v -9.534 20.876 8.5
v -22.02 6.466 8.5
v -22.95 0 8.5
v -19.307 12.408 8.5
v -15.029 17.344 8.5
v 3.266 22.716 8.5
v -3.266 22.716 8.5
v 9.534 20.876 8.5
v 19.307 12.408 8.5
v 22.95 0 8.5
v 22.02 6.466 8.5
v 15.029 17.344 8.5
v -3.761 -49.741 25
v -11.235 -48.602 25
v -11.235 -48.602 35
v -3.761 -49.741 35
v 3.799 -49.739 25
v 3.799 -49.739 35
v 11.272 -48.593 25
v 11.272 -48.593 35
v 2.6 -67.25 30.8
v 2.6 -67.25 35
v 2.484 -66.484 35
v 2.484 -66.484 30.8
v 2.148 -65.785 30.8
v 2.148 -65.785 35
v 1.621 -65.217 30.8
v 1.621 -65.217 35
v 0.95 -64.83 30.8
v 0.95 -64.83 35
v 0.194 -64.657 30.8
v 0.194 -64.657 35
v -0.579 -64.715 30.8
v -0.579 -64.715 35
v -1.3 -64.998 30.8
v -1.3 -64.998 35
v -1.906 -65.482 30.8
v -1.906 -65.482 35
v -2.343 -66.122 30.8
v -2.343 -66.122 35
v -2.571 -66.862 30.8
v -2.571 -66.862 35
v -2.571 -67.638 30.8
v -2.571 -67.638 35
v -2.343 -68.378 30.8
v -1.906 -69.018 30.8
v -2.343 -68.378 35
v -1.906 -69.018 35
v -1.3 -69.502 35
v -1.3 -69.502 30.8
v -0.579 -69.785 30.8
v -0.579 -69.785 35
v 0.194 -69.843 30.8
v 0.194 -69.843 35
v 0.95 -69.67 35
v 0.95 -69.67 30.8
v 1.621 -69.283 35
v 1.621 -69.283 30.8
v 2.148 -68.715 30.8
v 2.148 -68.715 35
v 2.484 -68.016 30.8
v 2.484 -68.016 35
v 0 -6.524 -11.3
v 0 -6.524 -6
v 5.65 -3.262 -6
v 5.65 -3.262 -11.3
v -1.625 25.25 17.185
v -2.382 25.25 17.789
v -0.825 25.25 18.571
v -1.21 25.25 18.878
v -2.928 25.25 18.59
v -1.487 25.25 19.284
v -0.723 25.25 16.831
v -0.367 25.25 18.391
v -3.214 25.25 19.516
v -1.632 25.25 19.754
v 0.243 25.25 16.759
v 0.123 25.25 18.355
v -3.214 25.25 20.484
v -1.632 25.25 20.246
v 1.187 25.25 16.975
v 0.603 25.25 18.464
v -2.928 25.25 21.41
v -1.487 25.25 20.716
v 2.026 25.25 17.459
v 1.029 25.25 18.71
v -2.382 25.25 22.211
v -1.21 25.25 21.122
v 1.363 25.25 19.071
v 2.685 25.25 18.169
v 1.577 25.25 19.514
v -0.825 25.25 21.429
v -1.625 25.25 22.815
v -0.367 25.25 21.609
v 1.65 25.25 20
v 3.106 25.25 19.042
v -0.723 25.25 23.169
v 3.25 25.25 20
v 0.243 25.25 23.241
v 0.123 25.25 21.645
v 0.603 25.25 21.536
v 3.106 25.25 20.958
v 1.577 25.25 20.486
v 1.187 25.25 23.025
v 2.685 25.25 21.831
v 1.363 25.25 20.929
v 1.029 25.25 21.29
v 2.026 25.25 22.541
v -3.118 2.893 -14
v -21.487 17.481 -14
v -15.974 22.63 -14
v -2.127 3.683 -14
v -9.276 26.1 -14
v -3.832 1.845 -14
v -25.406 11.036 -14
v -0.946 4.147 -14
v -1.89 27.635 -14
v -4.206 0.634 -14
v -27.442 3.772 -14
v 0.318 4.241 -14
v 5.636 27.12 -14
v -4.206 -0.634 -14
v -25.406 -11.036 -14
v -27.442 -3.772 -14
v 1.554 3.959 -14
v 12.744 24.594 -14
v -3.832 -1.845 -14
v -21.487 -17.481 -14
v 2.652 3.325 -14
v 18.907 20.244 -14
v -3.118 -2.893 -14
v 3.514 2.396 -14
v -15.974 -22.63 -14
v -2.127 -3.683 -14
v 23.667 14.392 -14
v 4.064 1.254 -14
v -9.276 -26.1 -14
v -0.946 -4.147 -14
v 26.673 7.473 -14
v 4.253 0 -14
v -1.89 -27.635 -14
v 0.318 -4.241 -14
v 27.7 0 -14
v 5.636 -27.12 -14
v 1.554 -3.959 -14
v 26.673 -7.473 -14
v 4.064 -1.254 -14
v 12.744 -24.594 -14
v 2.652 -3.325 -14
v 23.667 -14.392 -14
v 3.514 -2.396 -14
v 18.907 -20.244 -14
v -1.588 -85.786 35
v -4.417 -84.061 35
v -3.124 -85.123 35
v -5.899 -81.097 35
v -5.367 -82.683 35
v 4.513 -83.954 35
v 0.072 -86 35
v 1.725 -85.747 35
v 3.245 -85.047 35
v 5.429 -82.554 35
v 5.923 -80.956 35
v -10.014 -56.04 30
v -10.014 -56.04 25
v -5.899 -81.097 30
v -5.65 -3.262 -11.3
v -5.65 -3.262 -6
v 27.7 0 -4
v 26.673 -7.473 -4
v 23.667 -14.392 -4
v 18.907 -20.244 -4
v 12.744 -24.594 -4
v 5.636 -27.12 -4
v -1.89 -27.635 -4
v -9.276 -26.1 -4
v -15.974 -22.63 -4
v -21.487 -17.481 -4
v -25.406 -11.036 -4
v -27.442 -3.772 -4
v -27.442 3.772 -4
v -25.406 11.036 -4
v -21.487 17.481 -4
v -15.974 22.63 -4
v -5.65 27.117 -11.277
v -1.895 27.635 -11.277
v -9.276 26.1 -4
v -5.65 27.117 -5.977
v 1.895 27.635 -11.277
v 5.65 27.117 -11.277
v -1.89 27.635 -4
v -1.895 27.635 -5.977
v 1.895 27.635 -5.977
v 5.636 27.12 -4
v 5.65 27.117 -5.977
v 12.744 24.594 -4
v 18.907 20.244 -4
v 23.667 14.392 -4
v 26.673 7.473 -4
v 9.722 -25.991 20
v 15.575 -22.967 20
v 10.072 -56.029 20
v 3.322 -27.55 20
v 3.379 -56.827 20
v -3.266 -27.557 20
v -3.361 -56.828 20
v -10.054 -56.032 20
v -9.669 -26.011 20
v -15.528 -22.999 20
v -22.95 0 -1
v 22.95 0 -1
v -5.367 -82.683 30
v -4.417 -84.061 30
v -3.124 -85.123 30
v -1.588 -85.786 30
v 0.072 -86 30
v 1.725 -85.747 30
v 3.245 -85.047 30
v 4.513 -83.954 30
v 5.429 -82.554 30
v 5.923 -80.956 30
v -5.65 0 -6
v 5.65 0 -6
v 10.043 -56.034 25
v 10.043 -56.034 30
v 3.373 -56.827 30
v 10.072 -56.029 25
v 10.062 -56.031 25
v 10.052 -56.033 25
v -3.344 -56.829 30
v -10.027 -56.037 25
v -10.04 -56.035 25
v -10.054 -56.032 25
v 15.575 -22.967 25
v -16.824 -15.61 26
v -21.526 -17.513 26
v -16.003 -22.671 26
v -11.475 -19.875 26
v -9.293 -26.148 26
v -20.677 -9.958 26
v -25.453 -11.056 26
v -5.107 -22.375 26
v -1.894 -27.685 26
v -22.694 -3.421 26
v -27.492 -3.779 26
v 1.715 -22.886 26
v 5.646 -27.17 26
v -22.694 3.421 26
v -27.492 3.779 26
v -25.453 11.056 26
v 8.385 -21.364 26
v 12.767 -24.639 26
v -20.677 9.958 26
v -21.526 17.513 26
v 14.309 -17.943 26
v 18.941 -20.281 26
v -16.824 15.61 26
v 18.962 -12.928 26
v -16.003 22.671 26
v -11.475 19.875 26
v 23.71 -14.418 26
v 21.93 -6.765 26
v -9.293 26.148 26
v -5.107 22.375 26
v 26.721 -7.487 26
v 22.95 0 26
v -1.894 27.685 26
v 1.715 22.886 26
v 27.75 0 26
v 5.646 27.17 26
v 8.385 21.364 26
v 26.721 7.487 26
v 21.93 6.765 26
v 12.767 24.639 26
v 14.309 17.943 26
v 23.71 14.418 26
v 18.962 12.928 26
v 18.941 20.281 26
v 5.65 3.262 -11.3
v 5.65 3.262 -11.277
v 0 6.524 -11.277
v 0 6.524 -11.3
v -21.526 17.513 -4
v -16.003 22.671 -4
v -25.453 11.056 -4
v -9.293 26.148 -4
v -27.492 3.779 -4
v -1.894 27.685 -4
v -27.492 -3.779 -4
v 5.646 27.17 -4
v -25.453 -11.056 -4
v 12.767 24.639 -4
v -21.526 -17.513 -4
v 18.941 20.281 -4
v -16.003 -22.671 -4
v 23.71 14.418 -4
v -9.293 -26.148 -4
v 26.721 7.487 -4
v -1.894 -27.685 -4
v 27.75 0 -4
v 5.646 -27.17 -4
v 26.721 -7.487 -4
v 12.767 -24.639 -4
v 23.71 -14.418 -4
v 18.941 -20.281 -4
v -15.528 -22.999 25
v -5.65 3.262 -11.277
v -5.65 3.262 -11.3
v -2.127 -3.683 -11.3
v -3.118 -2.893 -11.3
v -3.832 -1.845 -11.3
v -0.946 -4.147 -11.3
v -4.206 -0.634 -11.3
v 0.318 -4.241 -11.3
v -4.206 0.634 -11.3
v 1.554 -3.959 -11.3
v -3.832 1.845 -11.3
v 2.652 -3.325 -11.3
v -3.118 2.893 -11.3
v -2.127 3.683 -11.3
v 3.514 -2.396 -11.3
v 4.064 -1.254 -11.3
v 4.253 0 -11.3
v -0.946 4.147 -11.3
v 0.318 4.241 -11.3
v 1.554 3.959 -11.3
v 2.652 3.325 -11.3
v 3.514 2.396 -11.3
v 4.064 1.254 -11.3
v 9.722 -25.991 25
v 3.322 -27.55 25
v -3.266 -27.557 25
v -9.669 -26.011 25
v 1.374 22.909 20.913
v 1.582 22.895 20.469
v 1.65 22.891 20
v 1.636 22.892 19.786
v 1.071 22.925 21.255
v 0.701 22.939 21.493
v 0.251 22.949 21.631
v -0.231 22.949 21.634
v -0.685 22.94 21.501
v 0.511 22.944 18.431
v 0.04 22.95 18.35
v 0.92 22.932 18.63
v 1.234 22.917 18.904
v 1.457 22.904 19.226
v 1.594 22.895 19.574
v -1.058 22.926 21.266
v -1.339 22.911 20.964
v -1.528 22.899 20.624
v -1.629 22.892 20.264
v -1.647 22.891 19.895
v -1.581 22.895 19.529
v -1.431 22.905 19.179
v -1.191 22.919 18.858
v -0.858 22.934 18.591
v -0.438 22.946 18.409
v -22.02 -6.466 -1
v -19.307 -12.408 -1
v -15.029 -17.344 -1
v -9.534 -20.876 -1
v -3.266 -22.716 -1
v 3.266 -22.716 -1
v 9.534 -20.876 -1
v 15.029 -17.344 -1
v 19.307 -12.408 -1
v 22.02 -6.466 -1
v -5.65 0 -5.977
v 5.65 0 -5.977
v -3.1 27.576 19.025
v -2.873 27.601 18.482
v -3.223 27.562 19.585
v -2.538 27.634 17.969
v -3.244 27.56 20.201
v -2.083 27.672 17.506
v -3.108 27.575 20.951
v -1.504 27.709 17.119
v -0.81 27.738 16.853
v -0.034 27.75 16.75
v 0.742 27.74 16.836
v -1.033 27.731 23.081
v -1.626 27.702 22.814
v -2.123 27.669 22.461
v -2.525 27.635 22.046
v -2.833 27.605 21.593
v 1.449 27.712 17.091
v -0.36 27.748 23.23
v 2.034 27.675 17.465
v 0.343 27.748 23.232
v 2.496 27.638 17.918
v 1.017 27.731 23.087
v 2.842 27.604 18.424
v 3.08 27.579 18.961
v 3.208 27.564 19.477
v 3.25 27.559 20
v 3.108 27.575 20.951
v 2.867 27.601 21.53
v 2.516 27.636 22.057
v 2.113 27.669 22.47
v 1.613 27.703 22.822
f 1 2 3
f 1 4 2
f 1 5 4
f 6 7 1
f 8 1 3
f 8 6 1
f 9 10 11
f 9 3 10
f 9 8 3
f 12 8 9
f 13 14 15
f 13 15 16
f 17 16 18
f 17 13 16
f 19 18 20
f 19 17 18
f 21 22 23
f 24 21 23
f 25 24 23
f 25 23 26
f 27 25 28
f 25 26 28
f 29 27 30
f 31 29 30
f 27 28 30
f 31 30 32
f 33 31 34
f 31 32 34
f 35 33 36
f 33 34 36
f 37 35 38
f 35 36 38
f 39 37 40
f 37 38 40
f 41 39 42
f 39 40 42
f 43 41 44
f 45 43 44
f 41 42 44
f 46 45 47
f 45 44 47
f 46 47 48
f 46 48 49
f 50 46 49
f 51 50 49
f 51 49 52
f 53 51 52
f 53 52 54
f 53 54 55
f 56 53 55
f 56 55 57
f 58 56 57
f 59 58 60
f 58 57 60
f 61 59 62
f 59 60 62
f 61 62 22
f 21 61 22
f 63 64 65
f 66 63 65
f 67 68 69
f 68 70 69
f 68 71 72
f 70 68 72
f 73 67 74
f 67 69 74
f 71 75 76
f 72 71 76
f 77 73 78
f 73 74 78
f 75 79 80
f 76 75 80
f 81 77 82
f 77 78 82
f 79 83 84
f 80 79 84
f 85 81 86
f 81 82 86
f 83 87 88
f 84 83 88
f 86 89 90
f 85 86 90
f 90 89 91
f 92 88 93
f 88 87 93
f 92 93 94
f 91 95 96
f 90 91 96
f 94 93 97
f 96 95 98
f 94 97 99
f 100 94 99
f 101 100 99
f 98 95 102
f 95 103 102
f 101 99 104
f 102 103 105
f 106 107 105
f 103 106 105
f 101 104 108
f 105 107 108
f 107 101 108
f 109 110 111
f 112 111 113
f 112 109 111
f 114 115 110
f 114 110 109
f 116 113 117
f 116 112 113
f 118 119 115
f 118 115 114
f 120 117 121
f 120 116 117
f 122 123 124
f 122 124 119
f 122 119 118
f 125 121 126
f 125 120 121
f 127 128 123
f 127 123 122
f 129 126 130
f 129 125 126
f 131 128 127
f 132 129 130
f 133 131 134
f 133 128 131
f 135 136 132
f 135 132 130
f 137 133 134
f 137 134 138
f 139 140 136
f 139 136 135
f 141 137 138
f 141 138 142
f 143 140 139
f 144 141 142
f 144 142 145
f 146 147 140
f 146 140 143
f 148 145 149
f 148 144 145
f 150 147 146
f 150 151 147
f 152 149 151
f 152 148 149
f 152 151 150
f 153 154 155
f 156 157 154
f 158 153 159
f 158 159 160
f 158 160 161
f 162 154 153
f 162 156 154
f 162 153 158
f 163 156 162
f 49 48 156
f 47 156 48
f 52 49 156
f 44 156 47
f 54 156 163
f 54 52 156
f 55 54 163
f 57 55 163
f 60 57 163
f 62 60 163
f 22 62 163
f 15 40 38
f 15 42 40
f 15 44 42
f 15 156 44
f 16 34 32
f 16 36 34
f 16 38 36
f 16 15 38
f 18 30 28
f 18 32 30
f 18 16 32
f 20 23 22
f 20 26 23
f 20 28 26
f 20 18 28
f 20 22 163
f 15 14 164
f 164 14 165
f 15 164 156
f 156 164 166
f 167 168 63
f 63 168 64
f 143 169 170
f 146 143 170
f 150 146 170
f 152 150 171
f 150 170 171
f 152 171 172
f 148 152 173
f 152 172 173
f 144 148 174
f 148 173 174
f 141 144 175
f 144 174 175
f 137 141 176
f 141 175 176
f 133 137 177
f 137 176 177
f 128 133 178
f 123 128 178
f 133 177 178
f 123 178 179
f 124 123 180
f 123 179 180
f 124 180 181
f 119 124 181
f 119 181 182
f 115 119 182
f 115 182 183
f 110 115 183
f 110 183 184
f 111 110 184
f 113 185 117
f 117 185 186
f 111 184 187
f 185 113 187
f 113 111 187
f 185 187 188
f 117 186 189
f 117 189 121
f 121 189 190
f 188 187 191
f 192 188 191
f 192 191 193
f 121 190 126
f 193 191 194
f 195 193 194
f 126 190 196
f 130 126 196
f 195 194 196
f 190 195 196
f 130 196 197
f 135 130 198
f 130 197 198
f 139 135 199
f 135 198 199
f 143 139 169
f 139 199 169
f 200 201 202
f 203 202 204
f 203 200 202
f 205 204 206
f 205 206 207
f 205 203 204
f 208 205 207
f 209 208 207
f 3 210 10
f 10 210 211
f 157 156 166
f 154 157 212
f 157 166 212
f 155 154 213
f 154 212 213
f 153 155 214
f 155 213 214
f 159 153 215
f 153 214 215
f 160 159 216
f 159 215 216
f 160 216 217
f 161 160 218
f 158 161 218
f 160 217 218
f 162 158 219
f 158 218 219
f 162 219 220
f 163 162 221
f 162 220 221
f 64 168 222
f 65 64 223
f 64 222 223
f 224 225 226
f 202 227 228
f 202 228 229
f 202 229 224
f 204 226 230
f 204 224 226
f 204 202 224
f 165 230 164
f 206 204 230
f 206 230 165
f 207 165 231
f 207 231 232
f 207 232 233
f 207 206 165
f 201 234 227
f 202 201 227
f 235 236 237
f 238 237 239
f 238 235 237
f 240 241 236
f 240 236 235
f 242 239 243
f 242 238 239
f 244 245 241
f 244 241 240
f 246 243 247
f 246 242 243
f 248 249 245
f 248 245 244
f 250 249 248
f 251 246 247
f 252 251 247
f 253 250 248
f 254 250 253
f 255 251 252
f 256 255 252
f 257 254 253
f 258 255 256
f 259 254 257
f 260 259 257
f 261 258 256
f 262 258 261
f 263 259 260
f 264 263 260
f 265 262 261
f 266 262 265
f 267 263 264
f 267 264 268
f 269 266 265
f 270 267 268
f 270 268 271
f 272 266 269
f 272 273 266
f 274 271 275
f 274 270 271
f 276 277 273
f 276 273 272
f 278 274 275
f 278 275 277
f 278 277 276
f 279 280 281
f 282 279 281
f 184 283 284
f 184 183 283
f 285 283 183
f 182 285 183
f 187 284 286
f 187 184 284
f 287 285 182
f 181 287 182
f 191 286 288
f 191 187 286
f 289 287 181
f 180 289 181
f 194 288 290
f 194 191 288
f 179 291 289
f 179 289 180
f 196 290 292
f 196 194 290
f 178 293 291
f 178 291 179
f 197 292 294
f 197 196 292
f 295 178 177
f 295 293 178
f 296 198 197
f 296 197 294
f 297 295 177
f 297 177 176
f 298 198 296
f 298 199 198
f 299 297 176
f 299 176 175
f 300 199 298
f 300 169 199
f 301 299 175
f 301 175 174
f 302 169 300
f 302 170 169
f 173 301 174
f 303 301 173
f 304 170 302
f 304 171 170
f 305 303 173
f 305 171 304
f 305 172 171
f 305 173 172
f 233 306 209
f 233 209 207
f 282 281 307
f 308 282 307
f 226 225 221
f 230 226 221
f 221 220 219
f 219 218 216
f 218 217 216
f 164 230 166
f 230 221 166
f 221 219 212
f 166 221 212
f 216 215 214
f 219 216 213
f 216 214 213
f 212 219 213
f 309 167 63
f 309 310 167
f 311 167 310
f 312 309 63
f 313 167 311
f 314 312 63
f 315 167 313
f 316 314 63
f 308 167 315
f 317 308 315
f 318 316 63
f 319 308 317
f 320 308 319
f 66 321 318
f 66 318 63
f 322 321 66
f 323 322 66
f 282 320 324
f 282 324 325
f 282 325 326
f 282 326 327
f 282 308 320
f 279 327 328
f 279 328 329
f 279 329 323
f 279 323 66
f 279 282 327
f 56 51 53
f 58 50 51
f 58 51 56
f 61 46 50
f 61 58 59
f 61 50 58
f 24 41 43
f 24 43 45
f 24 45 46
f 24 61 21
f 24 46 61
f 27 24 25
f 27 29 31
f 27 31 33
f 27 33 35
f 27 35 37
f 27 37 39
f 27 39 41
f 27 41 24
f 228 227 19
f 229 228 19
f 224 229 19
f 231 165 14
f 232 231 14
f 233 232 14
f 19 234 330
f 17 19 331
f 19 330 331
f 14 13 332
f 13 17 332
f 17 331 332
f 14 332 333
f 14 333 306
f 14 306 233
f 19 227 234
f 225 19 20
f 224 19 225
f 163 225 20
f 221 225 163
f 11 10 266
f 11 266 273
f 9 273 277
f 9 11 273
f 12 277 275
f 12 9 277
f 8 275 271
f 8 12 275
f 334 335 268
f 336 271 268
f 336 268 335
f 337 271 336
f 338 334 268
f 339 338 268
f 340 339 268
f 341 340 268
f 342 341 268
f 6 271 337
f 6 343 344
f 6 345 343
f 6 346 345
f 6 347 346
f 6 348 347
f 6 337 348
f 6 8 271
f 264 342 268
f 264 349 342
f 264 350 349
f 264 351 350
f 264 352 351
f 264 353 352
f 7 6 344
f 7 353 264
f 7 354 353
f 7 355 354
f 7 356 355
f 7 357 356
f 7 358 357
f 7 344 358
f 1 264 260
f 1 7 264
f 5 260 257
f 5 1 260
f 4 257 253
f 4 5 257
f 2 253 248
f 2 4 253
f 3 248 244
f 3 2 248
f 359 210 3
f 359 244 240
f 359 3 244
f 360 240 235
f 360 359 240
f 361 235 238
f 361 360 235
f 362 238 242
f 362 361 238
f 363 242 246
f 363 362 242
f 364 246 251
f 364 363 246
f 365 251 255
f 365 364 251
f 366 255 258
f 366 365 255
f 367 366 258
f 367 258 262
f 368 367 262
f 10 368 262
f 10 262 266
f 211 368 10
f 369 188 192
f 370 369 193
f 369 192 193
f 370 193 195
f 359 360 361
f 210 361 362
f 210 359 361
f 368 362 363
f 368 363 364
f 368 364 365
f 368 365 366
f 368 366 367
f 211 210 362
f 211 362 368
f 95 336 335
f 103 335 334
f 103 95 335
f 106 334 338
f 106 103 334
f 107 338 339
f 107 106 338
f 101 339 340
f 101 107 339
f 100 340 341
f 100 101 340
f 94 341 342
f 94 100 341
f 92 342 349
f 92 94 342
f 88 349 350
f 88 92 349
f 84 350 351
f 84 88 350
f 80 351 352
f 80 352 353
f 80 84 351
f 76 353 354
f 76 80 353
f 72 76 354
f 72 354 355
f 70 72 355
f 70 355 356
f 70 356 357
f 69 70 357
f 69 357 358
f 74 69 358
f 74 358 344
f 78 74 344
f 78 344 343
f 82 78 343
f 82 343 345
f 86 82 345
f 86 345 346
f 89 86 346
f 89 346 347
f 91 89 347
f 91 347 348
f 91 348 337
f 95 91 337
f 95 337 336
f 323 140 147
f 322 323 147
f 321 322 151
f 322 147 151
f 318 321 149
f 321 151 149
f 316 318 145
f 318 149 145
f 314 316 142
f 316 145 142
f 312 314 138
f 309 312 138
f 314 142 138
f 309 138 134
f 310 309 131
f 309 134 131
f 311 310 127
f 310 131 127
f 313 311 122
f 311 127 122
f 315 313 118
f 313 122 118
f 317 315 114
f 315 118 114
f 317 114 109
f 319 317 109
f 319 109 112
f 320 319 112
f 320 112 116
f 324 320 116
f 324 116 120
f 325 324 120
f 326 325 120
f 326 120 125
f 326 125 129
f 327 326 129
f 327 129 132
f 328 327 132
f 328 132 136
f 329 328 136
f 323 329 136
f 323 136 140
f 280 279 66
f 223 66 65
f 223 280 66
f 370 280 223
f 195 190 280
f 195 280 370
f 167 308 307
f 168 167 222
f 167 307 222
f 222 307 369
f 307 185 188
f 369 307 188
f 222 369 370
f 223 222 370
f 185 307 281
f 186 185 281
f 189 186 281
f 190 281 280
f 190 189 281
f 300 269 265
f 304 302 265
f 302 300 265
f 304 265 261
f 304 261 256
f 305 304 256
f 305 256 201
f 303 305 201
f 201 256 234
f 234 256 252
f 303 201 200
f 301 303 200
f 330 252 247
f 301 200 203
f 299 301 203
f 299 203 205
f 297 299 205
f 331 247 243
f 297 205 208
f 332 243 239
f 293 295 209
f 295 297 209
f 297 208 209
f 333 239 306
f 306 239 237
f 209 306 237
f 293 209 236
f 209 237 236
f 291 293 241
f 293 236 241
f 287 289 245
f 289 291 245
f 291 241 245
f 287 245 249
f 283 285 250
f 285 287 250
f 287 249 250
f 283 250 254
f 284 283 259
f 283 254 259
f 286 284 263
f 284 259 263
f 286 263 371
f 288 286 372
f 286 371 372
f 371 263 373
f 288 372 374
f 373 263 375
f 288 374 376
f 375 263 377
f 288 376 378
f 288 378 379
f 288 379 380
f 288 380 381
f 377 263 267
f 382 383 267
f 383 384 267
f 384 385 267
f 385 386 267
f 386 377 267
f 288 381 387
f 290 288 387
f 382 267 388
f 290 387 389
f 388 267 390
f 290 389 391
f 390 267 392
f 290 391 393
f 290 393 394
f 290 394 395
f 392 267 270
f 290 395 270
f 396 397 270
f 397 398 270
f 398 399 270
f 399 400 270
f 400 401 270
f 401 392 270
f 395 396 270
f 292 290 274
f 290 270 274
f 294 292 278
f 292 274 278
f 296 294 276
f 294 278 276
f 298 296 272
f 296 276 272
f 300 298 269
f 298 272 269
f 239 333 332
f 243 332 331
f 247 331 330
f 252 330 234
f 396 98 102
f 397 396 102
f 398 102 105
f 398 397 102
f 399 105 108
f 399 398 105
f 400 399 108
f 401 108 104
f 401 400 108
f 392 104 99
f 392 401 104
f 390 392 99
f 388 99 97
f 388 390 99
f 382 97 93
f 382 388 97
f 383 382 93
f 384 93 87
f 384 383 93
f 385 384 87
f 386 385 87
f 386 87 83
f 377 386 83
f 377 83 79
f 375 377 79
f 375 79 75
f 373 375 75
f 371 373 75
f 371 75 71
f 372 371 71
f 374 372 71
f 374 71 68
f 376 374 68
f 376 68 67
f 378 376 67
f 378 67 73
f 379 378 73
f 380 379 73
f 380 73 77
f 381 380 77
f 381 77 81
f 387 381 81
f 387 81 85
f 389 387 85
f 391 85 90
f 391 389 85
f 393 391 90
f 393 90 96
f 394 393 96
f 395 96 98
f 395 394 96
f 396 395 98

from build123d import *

# Parameters (mm, degrees)
CYLINDER016_R     = 1.65
CYLINDER016_DEPTH = 50
CYLINDER017_R     = 3.25
CYLINDER017_DEPTH = 2.5
BOX005_W          = 80
BOX005_H          = 100
BOX005_DEPTH      = 9.5
CYLINDER014_R     = 22.95
CYLINDER014_DEPTH = 27
CYLINDER015_R     = 27.75
CYLINDER015_DEPTH = 40
SKETCH013_R       = 27.75
PAD001_DEPTH      = 10
SKETCH014_W       = 24
SKETCH014_H       = 14.2
POCKET013_DEPTH   = 28
SKETCH015_R       = 8.1
POCKET014_DEPTH   = 15
POCKET015_DEPTH   = 14.4
PAD003_DEPTH      = 5
PAD004_DEPTH      = 10
POCKET017_DEPTH   = 10
SKETCH022_R       = 2.6
POCKET018_DEPTH   = 4.2
SKETCH023_W       = 108.293205
SKETCH023_H       = 87.132465
POCKET019_DEPTH   = 20
SKETCH024_R       = 27.699707
PAD005_DEPTH      = 10
SKETCH025_W       = 11.3
SKETCH025_H       = 5.3
POCKET020_DEPTH   = 33
POCKET021_DEPTH   = 5.3
SKETCH027_R       = 4.253317
POCKET022_DEPTH   = 8


with BuildPart() as cylinder016:
    # Cylinder016 → Cylinder016 (new body)
    with BuildSketch(Plane(origin=(0, 50, 20), x_dir=(1, 0, 0), z_dir=(0, -1, 0))):
        Circle(CYLINDER016_R)
    extrude(amount=CYLINDER016_DEPTH)


with BuildPart() as cylinder017:
    # Cylinder017 → Cylinder017 (new body)
    with BuildSketch(Plane(origin=(0, 27.75, 20), x_dir=(1, 0, 0), z_dir=(0, -1, 0))):
        Circle(CYLINDER017_R)
    extrude(amount=CYLINDER017_DEPTH)


with BuildPart() as addcube001:
    # Box005 → Box005 (new body)
    with BuildSketch(Plane(origin=(-40, 0, -1), x_dir=(1, 0, 0), z_dir=(0, 0, 1))):
        with Locations((40, 50)):
            Rectangle(BOX005_W, BOX005_H)
    extrude(amount=BOX005_DEPTH)


with BuildPart() as fusion007:
    # Cylinder014 → Cylinder014 (new body)
    with BuildSketch(Plane.XY.offset(-1)):
        Circle(CYLINDER014_R)
    extrude(amount=CYLINDER014_DEPTH)

    # Cut011: cut AddCube001
    add(addcube001.part, mode=Mode.SUBTRACT)

    # Fusion007: union Cylinder016, Cylinder017
    add(cylinder016.part)
    add(cylinder017.part)


with BuildPart() as mounttotripod:
    # Cylinder015 → Cylinder015 (new body)
    with BuildSketch(Plane.XY.offset(-14)):
        Circle(CYLINDER015_R)
    extrude(amount=CYLINDER015_DEPTH)

    # Cut010: cut Fusion007
    add(fusion007.part, mode=Mode.SUBTRACT)

    # Sketch013 (on Face2 of BaseFeature003) → Pad001 (new body)
    with BuildSketch(Plane(origin=(0, 0, -14), x_dir=(1, 0, 0), z_dir=(0, 0, -1))):
        Circle(SKETCH013_R)
    extrude(amount=PAD001_DEPTH)

    # Sketch014 → Pocket013 (cut)
    with BuildSketch(Plane(origin=(0, 28, 0), x_dir=(-1, 0, 0), z_dir=(0, 1, 0))):
        with Locations((0, -12.1)):
            Rectangle(SKETCH014_W, SKETCH014_H)
    extrude(amount=-POCKET013_DEPTH, mode=Mode.SUBTRACT)

    # Sketch015 (on Face6 of Pocket013) → Pocket014 (cut)
    with BuildSketch(Plane(origin=(0, 0, -24), x_dir=(1, 0, 0), z_dir=(0, 0, -1))):
        Circle(SKETCH015_R)
    extrude(amount=-POCKET014_DEPTH, mode=Mode.SUBTRACT)

    # Sketch016 (on Face6 of Pocket014) → Pocket015 (cut)
    with BuildSketch(Plane(origin=(0, 0, -19.3), x_dir=(1, 0, 0), z_dir=(0, 0, -1))):
        Polygon((0, -14.036056), (12.155581, -7.018028), (12.155581, 7.018028), (0, 14.036056), (-12.155581, 7.018028), (-12.155581, -7.018028), align=None)
    extrude(amount=-POCKET015_DEPTH, mode=Mode.SUBTRACT)

    # Sketch019 (on Face8 of Pocket015) → Pad003 (join)
    with BuildSketch(Plane.XY.offset(25)):
        with BuildLine():
            ThreePointArc((-15.553331, -22.846971), (0.028426, -27.638548), (15.600294, -22.814929))
            Line((15.600294, -22.814929), (5.918583, -80.985076))
            ThreePointArc((-5.919268, -80.980951), (-0.002091, -86), (5.918583, -80.985076))
            Line((-15.553331, -22.846971), (-5.919268, -80.980951))
        make_face()
    extrude(amount=-PAD003_DEPTH)

    # Sketch020 (on Face12 of Pad003) → Pad004 (join)
    with BuildSketch(Plane.XY.offset(25)):
        with BuildLine():
            ThreePointArc((-5.898869, -81.096969), (0.071542, -85.999573), (5.92335, -80.955994))
            Line((11.272496, -48.593121), (5.92335, -80.955994))
            ThreePointArc((-11.235042, -48.601794), (0.019223, -49.883466), (11.272496, -48.593121))
            Line((-11.235042, -48.601794), (-5.898869, -81.096969))
        make_face()
    extrude(amount=PAD004_DEPTH)

    # Sketch021 (on Face10 of Pad004) → Pocket017 (cut)
    with BuildSketch(Plane(origin=(0, 0, 20), x_dir=(1, 0, 0), z_dir=(0, 0, -1))):
        with BuildLine():
            ThreePointArc((17.426701, 54.194258), (-0.181494, 56.926923), (-17.771906, 54.082038))
            Line((-17.771906, 54.082038), (-17.771906, 91.276634))
            Line((17.426701, 91.276634), (-17.771906, 91.276634))
            Line((17.426701, 54.194258), (17.426701, 91.276634))
        make_face()
    extrude(amount=-POCKET017_DEPTH, mode=Mode.SUBTRACT)

    # Sketch022 (on Face33 of Pocket017) → Pocket018 (cut)
    with BuildSketch(Plane.XY.offset(35)):
        with Locations((0, -67.25)):
            Circle(SKETCH022_R)
    extrude(amount=-POCKET018_DEPTH, mode=Mode.SUBTRACT)

    # Sketch023 (on Face6 of Pocket018) → Pocket019 (cut)
    with BuildSketch(Plane(origin=(0, 0, -24), x_dir=(1, 0, 0), z_dir=(0, 0, -1))):
        with Locations((-3.019794, 5.274049)):
            Rectangle(SKETCH023_W, SKETCH023_H)
    extrude(amount=-POCKET019_DEPTH, mode=Mode.SUBTRACT)

    # Sketch024 (on Face2 of Pocket019) → Pad005 (join)
    with BuildSketch(Plane(origin=(0, 0, -4), x_dir=(1, 0, 0), z_dir=(0, 0, -1))):
        Circle(SKETCH024_R)
    extrude(amount=PAD005_DEPTH)

    # Sketch025 → Pocket020 (cut)
    with BuildSketch(Plane.XZ.offset(-33)):
        with Locations((0, -8.627069)):
            Rectangle(SKETCH025_W, SKETCH025_H)
    extrude(amount=POCKET020_DEPTH, mode=Mode.SUBTRACT)

    # Sketch026 → Pocket021 (cut)
    with BuildSketch(Plane.XY.offset(-6)):
        Polygon((5.65, -3.262029), (5.65, 3.262029), (0, 6.524058), (-5.65, 3.262029), (-5.65, -3.262029), (0, -6.524058), align=None)
    extrude(amount=-POCKET021_DEPTH, mode=Mode.SUBTRACT)

    # Sketch027 (on Face16 of Pocket021) → Pocket022 (cut)
    with BuildSketch(Plane(origin=(0, 0, -14), x_dir=(1, 0, 0), z_dir=(0, 0, -1))):
        Circle(SKETCH027_R)
    extrude(amount=-POCKET022_DEPTH, mode=Mode.SUBTRACT)


solid = mounttotripod.part
